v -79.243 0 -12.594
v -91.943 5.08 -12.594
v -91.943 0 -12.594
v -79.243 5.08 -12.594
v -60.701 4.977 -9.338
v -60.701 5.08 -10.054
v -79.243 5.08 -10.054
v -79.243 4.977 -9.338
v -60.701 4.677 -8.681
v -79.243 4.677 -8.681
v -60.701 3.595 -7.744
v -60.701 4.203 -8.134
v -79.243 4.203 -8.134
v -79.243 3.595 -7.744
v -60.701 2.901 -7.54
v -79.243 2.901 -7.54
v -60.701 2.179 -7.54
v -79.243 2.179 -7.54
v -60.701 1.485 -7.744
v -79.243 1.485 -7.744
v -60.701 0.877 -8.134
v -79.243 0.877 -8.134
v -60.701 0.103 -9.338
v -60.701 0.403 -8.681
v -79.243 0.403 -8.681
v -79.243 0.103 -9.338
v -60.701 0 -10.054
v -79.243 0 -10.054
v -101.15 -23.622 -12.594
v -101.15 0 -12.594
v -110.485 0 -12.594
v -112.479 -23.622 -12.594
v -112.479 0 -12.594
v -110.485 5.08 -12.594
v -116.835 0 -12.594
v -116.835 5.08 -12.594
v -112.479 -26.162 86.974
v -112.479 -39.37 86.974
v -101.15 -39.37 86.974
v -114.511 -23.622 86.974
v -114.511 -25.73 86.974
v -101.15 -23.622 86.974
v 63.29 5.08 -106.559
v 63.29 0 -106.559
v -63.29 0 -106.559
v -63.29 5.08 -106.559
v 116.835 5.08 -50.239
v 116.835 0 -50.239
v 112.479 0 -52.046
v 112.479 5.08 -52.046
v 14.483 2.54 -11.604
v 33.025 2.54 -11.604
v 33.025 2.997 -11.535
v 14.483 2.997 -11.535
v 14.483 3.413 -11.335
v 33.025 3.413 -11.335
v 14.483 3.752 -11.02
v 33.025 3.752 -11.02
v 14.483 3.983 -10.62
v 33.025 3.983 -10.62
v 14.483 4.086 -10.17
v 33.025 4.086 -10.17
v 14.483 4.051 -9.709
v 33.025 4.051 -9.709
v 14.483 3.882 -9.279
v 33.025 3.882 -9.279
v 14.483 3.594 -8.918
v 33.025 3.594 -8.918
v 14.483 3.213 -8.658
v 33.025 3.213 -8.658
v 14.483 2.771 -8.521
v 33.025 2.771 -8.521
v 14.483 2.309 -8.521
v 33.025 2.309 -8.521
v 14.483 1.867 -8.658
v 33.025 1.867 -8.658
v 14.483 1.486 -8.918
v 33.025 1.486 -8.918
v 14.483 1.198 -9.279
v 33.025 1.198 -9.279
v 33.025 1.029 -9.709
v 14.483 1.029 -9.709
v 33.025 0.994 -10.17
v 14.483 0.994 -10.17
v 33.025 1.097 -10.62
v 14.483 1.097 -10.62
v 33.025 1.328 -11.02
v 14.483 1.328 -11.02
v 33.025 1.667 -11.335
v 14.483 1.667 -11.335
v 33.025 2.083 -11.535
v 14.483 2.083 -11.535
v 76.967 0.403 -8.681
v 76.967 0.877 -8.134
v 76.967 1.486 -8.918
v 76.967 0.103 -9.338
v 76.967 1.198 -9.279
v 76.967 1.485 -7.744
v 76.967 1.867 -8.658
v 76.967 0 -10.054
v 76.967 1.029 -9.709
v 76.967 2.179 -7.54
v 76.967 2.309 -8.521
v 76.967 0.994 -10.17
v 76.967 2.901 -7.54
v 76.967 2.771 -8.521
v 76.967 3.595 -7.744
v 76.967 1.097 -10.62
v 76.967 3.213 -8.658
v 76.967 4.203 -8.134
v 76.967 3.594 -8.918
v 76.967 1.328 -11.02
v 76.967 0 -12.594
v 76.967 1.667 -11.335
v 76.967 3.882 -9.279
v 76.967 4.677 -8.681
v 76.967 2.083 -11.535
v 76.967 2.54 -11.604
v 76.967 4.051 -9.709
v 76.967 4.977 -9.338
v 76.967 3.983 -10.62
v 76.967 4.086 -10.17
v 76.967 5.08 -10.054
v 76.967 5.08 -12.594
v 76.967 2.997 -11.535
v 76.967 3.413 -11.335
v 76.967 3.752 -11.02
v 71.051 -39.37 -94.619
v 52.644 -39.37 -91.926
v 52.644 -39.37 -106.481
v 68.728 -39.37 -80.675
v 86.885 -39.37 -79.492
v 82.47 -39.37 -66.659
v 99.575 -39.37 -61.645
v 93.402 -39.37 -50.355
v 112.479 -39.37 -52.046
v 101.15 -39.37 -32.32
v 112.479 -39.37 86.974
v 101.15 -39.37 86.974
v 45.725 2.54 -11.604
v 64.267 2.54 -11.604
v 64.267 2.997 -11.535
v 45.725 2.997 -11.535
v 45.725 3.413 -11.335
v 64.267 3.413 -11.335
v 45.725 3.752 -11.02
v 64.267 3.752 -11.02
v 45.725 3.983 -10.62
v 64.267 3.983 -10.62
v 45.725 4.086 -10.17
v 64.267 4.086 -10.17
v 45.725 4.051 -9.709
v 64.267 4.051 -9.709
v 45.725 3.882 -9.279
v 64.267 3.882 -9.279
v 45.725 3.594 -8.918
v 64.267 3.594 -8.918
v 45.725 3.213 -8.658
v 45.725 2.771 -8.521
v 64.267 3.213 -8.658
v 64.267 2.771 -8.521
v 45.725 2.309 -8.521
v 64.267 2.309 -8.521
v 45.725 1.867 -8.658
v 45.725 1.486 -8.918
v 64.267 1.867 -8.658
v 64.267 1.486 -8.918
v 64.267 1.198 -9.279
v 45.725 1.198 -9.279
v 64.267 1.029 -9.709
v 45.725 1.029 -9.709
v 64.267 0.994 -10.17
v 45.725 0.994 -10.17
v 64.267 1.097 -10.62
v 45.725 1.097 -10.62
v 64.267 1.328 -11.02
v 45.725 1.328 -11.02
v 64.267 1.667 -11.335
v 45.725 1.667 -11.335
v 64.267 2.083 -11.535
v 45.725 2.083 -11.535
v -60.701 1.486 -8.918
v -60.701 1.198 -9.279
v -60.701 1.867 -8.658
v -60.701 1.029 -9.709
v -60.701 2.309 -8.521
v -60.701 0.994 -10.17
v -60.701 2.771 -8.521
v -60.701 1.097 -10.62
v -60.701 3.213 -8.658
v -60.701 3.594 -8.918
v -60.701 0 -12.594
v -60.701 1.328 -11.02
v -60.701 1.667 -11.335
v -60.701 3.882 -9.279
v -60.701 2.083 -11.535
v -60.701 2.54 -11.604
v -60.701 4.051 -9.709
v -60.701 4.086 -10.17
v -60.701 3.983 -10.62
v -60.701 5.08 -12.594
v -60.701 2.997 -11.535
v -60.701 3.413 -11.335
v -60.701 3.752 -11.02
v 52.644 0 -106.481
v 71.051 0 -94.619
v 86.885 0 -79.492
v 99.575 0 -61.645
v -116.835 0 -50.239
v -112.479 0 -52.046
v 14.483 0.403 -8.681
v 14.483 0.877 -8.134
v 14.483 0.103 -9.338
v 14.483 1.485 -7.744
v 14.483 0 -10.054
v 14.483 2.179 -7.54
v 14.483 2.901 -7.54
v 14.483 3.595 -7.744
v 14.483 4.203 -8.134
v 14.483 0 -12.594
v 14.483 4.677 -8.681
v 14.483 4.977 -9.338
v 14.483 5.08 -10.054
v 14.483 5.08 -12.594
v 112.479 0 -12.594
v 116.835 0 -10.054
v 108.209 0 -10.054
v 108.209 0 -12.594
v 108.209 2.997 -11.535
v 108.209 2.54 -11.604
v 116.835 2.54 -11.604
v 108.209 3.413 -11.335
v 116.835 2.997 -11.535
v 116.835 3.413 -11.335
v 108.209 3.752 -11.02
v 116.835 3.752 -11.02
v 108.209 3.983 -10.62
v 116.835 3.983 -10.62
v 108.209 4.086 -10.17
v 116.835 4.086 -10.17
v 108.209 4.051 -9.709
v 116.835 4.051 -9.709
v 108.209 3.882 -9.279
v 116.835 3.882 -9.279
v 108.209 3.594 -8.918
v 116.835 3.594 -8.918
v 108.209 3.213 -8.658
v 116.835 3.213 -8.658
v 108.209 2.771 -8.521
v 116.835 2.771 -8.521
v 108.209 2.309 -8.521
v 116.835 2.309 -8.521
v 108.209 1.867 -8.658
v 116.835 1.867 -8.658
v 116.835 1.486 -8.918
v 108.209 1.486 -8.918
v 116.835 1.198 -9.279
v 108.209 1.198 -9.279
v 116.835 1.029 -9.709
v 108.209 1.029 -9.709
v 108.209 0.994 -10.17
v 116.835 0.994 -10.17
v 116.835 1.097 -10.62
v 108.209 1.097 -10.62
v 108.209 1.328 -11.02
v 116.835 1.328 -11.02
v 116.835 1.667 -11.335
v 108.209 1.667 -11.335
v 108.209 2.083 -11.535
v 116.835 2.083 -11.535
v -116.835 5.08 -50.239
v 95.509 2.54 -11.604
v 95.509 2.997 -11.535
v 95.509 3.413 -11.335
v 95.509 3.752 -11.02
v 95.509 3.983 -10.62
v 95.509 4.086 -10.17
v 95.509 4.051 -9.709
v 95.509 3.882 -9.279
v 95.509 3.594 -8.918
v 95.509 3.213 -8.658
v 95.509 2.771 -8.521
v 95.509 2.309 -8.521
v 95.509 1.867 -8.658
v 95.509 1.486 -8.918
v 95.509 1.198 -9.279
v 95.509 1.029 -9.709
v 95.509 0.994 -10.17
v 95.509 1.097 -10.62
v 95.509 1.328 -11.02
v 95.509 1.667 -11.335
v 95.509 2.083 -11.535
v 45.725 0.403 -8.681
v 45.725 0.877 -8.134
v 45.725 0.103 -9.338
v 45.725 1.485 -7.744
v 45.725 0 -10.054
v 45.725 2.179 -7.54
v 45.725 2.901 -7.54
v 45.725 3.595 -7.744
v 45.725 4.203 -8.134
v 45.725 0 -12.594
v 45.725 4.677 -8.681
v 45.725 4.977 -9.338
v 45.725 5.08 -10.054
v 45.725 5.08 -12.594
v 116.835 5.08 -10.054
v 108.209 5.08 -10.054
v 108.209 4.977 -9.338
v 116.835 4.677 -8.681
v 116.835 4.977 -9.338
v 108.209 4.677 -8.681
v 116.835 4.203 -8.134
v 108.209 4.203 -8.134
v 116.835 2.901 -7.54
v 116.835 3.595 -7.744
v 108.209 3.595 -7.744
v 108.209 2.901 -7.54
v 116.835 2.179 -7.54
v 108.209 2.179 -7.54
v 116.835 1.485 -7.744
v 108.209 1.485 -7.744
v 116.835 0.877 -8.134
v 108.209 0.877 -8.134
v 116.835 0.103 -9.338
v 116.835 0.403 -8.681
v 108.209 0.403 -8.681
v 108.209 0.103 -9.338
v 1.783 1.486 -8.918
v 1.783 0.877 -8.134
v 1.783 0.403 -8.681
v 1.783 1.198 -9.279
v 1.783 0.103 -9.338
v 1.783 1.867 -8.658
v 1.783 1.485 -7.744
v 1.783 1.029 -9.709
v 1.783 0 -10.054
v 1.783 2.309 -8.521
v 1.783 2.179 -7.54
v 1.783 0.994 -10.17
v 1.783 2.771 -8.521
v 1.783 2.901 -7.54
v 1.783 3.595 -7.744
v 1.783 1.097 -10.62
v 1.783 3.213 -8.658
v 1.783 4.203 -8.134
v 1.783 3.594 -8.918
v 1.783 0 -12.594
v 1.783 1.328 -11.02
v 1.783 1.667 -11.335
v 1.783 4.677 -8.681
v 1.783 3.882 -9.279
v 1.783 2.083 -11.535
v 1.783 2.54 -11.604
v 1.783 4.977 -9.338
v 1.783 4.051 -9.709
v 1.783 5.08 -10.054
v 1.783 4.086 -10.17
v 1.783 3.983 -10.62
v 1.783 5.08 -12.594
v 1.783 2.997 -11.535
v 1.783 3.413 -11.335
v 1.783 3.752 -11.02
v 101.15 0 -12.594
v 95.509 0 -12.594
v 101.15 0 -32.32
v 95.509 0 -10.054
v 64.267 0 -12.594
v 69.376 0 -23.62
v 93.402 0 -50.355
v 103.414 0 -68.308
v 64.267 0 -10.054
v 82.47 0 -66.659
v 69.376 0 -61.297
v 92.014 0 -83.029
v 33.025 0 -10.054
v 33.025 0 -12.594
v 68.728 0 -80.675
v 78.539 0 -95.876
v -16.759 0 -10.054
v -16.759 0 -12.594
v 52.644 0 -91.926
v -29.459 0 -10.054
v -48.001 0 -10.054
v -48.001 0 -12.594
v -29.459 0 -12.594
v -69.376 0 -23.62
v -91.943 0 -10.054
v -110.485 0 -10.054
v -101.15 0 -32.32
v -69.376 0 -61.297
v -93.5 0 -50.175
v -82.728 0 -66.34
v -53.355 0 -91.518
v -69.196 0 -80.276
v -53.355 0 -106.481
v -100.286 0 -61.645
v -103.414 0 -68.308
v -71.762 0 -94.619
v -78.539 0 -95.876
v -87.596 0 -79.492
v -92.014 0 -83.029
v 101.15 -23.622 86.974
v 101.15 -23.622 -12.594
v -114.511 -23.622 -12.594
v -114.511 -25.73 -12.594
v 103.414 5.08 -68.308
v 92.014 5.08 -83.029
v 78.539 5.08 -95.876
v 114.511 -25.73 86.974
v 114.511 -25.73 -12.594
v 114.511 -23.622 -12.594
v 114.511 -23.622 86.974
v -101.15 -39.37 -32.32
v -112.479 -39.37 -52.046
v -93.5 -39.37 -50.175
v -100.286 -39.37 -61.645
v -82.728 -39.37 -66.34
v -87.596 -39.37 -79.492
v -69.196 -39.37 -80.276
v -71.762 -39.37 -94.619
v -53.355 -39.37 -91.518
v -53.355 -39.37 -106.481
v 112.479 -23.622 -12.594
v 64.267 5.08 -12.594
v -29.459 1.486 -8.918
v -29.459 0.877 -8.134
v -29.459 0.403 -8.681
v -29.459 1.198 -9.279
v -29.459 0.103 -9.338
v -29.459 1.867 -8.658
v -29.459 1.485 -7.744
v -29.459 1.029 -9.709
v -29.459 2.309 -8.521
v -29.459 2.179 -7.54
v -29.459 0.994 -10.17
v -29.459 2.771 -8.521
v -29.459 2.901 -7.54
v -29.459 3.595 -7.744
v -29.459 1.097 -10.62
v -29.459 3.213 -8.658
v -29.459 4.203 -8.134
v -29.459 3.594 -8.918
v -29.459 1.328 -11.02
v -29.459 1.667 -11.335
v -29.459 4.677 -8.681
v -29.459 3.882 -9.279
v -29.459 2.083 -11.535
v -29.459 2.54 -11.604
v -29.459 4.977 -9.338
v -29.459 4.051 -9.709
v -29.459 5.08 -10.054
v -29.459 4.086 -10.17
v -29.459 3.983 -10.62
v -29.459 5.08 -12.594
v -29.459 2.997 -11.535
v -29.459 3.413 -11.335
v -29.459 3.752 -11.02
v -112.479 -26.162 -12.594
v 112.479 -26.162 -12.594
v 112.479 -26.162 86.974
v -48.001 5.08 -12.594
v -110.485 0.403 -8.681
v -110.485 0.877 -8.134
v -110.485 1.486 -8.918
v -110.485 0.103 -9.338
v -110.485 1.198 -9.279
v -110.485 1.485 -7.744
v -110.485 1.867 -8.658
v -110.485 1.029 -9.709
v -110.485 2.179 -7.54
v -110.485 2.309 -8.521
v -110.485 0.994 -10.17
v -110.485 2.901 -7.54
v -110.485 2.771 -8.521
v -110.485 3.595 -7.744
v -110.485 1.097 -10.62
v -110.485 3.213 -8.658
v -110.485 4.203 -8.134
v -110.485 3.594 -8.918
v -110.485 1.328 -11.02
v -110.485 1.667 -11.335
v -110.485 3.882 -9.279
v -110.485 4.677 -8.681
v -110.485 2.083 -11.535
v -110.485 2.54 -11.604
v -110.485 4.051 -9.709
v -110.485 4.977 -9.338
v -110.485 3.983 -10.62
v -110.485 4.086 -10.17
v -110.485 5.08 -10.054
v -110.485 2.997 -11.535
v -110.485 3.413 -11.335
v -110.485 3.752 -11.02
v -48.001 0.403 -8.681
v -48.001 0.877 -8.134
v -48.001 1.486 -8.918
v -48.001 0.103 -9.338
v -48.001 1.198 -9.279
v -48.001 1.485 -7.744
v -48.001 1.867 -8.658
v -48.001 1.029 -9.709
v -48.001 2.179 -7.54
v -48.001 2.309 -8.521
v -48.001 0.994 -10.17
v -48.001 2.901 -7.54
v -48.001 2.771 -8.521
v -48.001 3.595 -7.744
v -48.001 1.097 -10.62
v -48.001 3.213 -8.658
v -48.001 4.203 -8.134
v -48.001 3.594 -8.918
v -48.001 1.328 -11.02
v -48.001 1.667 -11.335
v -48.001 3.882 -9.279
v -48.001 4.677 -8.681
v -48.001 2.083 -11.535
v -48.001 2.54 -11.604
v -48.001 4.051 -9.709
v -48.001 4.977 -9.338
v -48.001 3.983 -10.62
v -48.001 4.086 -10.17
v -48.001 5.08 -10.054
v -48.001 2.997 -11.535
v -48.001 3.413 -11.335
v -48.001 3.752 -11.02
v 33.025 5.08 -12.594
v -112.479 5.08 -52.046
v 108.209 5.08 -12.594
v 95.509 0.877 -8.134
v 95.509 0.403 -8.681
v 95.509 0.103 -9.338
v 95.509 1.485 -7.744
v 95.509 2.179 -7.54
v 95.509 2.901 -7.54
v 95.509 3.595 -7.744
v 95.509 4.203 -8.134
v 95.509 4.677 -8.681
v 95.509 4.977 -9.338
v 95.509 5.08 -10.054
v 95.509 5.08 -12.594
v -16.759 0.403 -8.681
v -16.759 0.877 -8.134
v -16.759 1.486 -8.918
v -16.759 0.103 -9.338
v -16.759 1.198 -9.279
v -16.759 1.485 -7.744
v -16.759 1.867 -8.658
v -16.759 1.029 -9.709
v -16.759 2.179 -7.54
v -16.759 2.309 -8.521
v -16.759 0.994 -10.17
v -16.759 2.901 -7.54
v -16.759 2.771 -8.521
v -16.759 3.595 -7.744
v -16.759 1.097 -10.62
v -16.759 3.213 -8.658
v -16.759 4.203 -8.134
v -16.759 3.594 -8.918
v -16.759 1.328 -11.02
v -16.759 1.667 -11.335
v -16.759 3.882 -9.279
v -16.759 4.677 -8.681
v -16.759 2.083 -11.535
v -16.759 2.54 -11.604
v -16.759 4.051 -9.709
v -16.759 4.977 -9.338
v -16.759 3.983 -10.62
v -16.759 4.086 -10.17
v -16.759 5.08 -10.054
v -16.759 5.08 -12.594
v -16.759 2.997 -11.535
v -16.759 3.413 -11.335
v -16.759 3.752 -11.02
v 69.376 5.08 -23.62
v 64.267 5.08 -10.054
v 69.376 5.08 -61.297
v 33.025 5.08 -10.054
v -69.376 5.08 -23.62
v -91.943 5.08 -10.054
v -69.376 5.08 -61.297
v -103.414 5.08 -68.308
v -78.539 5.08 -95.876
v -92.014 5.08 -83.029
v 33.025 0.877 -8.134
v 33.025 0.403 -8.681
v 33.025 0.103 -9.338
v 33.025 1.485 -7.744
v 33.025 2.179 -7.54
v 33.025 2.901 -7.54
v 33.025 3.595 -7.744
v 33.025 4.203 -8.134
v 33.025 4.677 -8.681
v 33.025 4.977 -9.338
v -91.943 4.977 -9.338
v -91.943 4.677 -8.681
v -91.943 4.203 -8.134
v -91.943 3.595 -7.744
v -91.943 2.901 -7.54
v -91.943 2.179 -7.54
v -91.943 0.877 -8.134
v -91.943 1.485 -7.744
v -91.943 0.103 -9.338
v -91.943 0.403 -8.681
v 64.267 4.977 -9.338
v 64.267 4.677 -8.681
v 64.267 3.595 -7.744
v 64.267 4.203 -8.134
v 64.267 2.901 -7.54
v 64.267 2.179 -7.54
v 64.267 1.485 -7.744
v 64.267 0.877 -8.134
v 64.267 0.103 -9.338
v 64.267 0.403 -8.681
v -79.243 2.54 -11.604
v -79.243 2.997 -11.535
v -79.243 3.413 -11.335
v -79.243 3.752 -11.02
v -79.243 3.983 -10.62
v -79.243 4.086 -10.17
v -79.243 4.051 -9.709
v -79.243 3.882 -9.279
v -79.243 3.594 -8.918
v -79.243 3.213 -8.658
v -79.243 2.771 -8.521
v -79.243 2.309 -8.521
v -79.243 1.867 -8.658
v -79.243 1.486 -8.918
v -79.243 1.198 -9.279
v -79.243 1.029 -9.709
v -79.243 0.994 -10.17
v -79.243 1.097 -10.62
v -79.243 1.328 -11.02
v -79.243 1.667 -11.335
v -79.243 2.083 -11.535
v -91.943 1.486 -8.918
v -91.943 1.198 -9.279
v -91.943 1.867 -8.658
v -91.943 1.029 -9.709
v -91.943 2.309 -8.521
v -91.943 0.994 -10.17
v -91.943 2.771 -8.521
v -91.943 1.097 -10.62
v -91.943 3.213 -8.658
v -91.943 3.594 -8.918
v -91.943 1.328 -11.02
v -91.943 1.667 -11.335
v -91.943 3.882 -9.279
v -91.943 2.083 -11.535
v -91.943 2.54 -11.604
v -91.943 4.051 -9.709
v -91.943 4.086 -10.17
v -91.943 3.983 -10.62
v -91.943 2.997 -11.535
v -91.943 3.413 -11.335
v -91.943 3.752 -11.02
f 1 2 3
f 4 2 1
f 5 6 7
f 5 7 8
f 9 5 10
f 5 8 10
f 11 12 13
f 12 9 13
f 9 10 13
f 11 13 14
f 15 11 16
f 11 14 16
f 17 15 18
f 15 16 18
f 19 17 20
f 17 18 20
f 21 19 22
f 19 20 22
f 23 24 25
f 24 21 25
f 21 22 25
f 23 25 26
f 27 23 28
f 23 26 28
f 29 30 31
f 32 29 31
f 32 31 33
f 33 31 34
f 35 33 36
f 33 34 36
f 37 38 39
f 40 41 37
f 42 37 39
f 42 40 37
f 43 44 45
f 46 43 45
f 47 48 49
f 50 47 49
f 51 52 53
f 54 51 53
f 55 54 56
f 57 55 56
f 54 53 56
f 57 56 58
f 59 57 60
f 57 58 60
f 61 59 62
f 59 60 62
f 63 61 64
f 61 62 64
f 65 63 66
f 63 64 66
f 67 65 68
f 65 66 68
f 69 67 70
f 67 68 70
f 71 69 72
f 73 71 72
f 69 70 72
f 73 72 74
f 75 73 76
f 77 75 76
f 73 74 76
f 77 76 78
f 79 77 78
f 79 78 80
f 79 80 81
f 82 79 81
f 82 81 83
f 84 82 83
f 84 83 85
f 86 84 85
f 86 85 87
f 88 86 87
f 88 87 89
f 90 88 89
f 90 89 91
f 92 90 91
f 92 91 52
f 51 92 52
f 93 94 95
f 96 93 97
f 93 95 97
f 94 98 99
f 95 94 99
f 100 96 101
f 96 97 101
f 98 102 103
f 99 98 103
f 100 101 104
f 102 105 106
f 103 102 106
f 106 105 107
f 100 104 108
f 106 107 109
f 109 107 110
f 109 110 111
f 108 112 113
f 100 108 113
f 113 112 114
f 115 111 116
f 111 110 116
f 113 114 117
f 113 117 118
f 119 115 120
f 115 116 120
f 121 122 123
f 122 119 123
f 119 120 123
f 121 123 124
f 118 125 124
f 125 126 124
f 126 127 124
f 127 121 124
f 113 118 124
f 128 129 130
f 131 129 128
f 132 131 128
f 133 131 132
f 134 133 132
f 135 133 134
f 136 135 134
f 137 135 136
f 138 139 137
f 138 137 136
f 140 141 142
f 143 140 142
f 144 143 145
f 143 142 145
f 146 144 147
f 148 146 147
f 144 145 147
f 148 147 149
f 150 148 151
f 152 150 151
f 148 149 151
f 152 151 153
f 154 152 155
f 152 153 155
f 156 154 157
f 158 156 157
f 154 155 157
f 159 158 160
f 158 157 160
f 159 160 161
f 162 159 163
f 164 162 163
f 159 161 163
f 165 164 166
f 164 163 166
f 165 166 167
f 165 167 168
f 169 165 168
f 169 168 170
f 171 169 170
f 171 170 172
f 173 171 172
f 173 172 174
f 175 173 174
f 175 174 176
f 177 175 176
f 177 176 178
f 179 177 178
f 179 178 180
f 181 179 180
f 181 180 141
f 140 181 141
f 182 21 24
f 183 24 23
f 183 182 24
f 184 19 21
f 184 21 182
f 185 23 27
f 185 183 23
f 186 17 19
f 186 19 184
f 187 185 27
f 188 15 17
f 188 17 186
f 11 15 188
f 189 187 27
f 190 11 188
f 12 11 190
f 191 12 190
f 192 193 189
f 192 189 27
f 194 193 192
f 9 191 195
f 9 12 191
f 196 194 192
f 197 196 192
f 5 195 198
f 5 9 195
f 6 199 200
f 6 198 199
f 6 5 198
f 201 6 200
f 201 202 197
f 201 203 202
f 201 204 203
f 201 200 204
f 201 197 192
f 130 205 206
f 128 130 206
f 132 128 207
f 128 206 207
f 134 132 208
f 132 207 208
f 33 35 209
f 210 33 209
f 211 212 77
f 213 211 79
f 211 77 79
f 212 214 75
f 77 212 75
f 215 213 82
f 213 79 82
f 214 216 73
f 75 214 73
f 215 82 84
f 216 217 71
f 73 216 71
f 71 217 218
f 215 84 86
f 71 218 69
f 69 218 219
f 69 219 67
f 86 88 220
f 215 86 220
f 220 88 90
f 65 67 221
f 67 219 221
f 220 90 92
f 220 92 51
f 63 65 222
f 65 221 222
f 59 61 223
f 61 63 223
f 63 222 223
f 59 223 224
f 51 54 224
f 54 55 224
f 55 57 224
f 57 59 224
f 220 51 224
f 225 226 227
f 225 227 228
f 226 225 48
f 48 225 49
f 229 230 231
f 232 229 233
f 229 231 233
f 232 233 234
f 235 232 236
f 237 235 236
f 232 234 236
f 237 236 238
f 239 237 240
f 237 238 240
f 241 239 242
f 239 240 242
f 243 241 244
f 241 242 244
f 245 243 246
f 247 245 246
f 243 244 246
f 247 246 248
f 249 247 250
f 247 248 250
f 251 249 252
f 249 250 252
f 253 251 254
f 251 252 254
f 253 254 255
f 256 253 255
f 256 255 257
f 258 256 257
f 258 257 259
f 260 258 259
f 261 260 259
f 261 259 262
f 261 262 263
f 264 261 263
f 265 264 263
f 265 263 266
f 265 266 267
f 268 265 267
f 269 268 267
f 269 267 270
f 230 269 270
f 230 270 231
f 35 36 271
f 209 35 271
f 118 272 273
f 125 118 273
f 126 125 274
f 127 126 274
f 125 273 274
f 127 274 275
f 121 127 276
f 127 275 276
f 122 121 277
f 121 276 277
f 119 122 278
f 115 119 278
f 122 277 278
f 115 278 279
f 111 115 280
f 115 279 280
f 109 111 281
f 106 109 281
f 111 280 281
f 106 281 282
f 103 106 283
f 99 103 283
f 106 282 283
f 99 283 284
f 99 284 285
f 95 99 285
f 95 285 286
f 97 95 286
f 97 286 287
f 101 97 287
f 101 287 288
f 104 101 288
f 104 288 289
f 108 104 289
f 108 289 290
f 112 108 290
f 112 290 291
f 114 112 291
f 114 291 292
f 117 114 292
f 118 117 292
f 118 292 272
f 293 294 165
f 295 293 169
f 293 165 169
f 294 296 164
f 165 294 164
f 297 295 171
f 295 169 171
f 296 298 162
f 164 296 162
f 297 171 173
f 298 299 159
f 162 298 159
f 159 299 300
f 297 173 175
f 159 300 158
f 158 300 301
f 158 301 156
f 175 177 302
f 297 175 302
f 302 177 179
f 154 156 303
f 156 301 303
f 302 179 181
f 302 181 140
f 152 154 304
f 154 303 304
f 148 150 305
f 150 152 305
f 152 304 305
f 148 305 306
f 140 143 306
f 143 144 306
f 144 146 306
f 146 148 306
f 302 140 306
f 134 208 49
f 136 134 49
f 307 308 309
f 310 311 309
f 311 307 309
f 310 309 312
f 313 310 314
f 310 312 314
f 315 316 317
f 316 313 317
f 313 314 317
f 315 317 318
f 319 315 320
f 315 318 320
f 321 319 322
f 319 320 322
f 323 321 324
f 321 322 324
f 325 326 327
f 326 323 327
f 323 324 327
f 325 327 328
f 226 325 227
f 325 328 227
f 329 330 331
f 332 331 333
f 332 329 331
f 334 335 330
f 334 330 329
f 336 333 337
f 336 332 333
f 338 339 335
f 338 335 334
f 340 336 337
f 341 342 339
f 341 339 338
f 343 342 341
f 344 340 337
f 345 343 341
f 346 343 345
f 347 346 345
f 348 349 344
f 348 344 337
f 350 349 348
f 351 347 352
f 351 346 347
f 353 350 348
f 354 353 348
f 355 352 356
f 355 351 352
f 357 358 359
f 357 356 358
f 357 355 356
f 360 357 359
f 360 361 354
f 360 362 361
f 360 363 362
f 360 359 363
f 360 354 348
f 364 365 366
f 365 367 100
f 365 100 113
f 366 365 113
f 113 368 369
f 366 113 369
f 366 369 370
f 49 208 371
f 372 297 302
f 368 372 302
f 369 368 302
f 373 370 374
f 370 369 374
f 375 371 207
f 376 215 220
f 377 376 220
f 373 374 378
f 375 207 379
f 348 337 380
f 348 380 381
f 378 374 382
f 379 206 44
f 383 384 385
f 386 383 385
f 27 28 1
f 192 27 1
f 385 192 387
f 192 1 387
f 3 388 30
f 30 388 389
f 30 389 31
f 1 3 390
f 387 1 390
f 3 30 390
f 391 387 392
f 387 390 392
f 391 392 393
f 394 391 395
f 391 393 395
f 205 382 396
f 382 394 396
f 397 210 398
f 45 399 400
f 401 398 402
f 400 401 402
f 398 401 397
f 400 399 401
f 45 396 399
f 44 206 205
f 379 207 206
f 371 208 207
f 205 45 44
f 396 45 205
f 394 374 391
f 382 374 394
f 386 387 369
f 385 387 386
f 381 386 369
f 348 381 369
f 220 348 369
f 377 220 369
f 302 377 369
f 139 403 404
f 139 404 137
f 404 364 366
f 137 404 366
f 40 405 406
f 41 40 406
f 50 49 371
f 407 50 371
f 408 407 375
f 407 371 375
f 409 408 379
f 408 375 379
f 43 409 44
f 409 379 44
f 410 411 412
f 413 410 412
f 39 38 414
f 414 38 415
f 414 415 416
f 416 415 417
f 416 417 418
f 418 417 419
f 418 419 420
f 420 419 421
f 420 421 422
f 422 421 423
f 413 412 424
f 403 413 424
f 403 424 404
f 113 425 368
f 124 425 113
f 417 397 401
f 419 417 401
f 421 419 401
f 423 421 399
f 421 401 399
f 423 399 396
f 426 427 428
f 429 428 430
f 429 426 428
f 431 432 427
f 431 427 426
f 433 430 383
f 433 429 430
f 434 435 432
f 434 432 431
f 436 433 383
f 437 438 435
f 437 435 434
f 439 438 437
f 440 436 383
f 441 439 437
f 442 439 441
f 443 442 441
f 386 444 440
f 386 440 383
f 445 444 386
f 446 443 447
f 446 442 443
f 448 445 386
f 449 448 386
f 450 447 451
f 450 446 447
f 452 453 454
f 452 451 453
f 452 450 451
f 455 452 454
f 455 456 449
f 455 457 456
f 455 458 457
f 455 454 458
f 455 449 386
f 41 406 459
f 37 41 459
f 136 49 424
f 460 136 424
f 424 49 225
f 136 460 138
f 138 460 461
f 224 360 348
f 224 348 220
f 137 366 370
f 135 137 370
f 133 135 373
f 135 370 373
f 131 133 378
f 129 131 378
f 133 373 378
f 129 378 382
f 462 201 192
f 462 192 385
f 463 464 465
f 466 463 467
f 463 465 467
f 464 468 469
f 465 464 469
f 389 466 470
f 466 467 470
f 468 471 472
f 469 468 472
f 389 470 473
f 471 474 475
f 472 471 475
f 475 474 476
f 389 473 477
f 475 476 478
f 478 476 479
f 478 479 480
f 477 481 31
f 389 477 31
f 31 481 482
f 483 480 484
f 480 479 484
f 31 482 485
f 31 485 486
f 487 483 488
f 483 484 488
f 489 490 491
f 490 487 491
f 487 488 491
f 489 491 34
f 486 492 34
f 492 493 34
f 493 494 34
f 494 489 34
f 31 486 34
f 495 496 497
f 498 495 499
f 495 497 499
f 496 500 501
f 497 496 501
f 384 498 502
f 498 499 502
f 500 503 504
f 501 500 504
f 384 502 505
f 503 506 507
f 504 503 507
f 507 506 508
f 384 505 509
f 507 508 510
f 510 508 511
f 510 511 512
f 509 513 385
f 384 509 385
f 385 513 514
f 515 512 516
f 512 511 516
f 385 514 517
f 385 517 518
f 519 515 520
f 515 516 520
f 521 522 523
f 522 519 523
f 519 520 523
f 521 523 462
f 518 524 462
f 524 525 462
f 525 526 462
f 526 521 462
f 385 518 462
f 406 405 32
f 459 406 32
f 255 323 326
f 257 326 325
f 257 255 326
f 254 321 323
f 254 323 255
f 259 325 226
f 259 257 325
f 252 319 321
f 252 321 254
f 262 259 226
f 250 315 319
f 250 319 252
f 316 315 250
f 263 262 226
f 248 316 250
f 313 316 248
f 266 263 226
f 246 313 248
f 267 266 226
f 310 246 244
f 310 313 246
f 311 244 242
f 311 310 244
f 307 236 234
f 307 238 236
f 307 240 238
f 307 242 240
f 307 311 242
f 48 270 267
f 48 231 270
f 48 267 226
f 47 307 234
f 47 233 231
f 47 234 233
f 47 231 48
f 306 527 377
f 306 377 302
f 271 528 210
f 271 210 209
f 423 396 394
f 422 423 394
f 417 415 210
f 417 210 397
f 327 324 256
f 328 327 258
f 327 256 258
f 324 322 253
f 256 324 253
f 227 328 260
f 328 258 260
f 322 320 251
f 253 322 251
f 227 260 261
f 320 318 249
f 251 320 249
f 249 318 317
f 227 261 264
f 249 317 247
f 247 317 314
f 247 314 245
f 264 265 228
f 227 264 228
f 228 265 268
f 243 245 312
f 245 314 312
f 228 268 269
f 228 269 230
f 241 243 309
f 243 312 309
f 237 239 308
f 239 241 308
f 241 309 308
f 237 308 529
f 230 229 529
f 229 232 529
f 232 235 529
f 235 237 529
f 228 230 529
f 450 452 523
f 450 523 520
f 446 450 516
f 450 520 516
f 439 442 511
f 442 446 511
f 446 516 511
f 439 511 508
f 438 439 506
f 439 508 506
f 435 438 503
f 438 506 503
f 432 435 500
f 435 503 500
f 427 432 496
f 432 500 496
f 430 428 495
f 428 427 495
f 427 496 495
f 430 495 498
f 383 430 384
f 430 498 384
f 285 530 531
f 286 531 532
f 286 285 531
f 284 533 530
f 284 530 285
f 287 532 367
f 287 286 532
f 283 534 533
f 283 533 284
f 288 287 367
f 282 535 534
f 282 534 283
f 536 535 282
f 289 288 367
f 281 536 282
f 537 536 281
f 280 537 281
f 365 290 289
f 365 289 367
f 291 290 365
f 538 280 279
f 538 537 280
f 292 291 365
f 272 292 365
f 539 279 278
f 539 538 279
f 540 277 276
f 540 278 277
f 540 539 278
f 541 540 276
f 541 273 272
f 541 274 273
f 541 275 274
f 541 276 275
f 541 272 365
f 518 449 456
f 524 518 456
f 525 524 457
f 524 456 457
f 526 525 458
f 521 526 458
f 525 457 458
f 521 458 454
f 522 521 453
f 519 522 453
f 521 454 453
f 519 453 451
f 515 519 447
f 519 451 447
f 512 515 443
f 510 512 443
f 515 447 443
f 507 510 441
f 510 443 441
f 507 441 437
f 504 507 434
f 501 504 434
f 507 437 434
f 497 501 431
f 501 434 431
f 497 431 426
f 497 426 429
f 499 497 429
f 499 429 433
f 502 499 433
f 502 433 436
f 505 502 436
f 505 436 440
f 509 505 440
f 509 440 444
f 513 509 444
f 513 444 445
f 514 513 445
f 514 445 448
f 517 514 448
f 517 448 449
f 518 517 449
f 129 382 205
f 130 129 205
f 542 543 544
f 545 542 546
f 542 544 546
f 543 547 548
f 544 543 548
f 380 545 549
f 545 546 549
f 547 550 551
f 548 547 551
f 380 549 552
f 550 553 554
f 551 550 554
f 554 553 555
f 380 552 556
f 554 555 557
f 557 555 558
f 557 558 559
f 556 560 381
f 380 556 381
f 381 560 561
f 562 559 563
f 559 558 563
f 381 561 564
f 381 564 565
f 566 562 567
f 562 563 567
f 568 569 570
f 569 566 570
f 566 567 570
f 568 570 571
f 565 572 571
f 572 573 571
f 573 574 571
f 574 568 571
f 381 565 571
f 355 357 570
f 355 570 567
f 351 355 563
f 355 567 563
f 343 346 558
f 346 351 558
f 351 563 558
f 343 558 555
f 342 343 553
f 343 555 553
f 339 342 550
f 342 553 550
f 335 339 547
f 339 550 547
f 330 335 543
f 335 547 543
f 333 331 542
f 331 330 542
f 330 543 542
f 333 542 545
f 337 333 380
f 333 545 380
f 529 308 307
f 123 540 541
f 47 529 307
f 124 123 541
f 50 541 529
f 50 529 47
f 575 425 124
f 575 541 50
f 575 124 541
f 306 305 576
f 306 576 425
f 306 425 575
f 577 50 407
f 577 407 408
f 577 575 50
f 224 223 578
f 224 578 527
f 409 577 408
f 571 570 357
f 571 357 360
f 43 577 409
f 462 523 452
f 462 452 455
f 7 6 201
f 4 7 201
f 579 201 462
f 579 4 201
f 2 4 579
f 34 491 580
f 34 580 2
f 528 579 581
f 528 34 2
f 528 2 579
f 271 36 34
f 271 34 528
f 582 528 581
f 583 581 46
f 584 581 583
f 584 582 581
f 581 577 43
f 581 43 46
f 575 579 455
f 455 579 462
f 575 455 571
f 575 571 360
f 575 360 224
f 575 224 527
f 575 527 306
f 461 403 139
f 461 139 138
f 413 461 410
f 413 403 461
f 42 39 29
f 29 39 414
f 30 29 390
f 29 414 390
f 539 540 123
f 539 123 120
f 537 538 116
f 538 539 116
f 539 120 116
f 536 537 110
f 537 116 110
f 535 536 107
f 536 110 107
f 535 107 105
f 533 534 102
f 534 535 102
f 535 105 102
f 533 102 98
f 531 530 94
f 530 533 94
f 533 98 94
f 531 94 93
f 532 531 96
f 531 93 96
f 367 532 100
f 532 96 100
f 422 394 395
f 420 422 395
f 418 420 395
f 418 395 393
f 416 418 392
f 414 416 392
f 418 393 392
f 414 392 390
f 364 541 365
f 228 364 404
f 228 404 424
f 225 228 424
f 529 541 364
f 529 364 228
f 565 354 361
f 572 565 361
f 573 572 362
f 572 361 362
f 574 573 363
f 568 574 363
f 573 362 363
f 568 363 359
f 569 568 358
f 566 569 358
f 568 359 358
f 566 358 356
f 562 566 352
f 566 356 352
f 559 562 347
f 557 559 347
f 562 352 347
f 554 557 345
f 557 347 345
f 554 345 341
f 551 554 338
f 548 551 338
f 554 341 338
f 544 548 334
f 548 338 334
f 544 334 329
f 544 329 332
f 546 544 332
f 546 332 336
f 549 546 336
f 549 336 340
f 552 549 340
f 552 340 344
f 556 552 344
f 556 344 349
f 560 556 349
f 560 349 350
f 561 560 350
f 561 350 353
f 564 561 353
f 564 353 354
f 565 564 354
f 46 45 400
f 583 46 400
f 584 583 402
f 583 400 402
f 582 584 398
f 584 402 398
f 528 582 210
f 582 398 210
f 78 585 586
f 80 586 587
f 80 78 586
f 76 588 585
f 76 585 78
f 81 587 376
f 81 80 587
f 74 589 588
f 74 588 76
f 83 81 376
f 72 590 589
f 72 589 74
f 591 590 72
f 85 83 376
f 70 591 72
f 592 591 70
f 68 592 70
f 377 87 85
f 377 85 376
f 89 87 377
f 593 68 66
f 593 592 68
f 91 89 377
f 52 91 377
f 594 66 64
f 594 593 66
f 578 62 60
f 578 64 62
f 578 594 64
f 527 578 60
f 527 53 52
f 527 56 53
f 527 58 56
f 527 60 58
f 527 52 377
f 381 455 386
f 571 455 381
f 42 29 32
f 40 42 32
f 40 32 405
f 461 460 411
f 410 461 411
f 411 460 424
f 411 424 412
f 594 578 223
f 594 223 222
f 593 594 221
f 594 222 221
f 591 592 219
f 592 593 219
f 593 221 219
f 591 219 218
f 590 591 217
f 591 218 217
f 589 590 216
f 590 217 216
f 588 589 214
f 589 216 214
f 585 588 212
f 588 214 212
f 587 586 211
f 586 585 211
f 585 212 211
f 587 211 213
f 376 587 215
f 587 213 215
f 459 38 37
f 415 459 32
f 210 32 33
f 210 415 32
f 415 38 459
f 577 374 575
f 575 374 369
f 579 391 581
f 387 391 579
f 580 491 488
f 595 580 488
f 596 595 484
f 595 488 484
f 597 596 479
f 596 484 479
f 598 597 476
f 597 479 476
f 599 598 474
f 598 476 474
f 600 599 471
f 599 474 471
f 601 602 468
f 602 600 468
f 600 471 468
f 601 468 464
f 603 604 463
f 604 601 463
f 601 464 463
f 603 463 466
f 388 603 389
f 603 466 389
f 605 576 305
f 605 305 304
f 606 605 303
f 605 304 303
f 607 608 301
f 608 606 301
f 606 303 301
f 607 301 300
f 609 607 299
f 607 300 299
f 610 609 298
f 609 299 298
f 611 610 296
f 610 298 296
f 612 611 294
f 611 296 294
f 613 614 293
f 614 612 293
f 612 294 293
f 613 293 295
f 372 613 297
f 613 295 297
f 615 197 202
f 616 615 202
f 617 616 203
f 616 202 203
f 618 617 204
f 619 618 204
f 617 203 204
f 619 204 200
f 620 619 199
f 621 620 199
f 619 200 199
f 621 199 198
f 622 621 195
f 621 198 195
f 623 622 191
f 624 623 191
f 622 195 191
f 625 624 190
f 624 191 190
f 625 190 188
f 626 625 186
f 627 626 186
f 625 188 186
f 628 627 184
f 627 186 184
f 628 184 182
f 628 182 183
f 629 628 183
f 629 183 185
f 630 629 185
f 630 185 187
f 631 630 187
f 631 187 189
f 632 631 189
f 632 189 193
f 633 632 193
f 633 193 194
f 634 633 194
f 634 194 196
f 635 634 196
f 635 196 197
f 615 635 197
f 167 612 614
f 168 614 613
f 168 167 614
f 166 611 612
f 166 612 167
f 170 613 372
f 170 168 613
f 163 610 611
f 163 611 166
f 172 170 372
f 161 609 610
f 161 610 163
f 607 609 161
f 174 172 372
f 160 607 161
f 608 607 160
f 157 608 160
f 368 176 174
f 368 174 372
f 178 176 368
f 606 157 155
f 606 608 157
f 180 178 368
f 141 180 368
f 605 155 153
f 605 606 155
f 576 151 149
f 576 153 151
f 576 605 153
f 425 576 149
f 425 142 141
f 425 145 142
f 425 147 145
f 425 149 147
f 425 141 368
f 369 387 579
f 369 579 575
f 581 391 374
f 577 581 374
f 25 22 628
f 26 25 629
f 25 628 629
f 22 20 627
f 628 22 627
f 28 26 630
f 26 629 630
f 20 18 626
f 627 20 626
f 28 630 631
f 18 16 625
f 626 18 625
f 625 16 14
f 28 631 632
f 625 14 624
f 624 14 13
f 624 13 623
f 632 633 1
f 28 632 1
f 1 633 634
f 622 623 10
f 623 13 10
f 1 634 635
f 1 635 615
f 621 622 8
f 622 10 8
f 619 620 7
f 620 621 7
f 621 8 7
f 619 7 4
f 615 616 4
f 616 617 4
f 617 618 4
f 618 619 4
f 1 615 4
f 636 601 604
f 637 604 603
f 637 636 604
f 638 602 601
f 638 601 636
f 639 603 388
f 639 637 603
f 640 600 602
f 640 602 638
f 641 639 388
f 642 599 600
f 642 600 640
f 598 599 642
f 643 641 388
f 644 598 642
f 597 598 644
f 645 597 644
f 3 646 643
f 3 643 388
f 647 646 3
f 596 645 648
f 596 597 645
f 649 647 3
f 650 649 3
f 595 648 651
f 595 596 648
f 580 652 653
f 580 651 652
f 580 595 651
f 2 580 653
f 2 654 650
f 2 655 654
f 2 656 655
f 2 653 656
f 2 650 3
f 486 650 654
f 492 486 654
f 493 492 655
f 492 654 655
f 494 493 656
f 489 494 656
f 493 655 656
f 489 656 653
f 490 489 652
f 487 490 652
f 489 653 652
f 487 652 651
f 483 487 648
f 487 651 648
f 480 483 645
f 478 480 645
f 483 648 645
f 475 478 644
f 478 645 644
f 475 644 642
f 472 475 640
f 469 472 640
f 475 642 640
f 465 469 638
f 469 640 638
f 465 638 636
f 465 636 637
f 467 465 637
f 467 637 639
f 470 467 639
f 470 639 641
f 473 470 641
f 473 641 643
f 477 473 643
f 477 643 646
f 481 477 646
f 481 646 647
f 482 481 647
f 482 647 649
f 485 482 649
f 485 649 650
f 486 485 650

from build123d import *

# Parameters (mm, degrees)
BOSS_EXTRUDE1_DEPTH      = 5.08
BOSS_EXTRUDE2_DEPTH      = 154.427309
BOSS_EXTRUDE2_DEPTH_BACK = 154.427309
SKETCH2_R                = 2.54
SKETCH2_W                = 2.54
SKETCH2_H                = 5.08
SKETCH3_W                = 12.7
SKETCH3_H                = 6.227195603
CUT_EXTRUDE1_DEPTH       = 5.08
BOSS_EXTRUDE3_DEPTH      = 39.37
SKETCH5_W                = 138.751749018
SKETCH5_H                = 37.67744757
CUT_EXTRUDE2_DEPTH       = 5.08
SKETCH6_W                = 11.329576632
SKETCH6_H                = 15.748
BOSS_EXTRUDE4_DEPTH      = 99.568
SKETCH7_W                = 58.494788807
SKETCH7_H                = 56.964758344
CUT_EXTRUDE3_DEPTH       = 5.08
LIP1_START               = -12.594044208
LIP1_DEPTH               = 99.568
LIP2_START               = -12.594044208
LIP2_DEPTH               = 99.568
CUT_EXTRUDE4_REACH       = 261.821
SKETCH8_R                = 1.55


# Read off the part's stored shape, not the designer's step: Lip1, Lip2
with BuildPart() as part:
    # Sketch1 → Boss-Extrude1 (new body)
    with BuildSketch(Plane(origin=(0, 0, 0), x_dir=(1, 0, 0), z_dir=(0, 1, 0))):
        with BuildLine():
            ThreePointArc((-150.649044256, 36.211449361), (-152.994577449, 24.475760888), (-154.427308629, 12.594044208))
            Line((-154.427308629, 12.594044208), (0, 12.594044208))
            Line((0, 12.594044208), (0, 106.558758971))
            Line((0, 106.558758971), (-63.290413745, 106.558758971))
            ThreePointArc((-63.290413745, 106.558758971), (-92.01449877, 83.028775744), (-112.479484736, 52.046240008))
            Line((-112.479484736, 52.046240008), (-150.649044256, 36.211449361))
        make_face()
        with BuildLine():
            Line((0, 106.558758971), (0, 12.594044208))
            Line((0, 12.594044208), (154.427308629, 12.594044208))
            ThreePointArc((154.427308629, 12.594044208), (152.994577449, 24.475760888), (150.649044256, 36.211449361))
            Line((150.649044256, 36.211449361), (112.479484736, 52.046240008))
            ThreePointArc((112.479484736, 52.046240008), (92.01449877, 83.028775744), (63.290413745, 106.558758971))
            Line((63.290413745, 106.558758971), (0, 106.558758971))
        make_face()
    extrude(amount=BOSS_EXTRUDE1_DEPTH)

    # Sketch2 → Boss-Extrude2 (add, two sides: drawn at the far end of the back side and taken through both)
    with BuildSketch(Plane(origin=(0, 0, 0), x_dir=(0, 0, -1), z_dir=(1, 0, 0)).offset(-BOSS_EXTRUDE2_DEPTH_BACK)):
        with Locations((10.054044208, 2.54)):
            Circle(SKETCH2_R)
        with Locations((11.324044208, 2.54)):
            Rectangle(SKETCH2_W, SKETCH2_H)
    extrude(amount=BOSS_EXTRUDE2_DEPTH + BOSS_EXTRUDE2_DEPTH_BACK)

    # Sketch3 → Cut-Extrude1 (cut)
    with BuildSketch(Plane(origin=(0, 5.08, 0), x_dir=(1, 0, 0), z_dir=(0, 1, 0))):
        with Locations((-116.835308629, 9.480446407)):
            Rectangle(SKETCH3_W, SKETCH3_H)
        with Locations((-148.077308629, 9.480446407)):
            Rectangle(SKETCH3_W, SKETCH3_H)
        with Locations((-85.593308629, 9.480446407)):
            Rectangle(SKETCH3_W, SKETCH3_H)
        with Locations((-54.351308629, 9.480446407)):
            Rectangle(SKETCH3_W, SKETCH3_H)
        with Locations((-23.109308629, 9.480446407)):
            Rectangle(SKETCH3_W, SKETCH3_H)
        with Locations((8.132691371, 9.480446407)):
            Rectangle(SKETCH3_W, SKETCH3_H)
        with Locations((39.374691371, 9.480446407)):
            Rectangle(SKETCH3_W, SKETCH3_H)
        with Locations((70.616691371, 9.480446407)):
            Rectangle(SKETCH3_W, SKETCH3_H)
        with Locations((101.858691371, 9.480446407)):
            Rectangle(SKETCH3_W, SKETCH3_H)
        with Locations((133.100691371, 9.480446407)):
            Rectangle(SKETCH3_W, SKETCH3_H)
    extrude(amount=-CUT_EXTRUDE1_DEPTH, mode=Mode.SUBTRACT)

    # Sketch4 → Boss-Extrude3 (add)
    with BuildSketch(Plane.XZ):
        with BuildLine():
            Line((-53.354740134, -106.481309786), (-53.354740134, -91.517526844))
            ThreePointArc((-53.354740134, -91.517526844), (-82.728496733, -66.340222196), (-101.149908104, -32.320142108))
            Line((-101.149908104, -32.320142108), (-101.149908104, -52.046240008))
            Line((-101.149908104, -52.046240008), (-112.479484736, -52.046240008))
            Line((-112.479484736, -52.046240008), (-100.285956923, -61.644665115))
            ThreePointArc((-100.285956923, -61.644665115), (-80.038963099, -87.43196163), (-53.354740134, -106.481309786))
        make_face()
        Polygon((-101.149908104, -52.046240008), (-101.149908104, -32.320142108), (-101.149908104, -12.594044208), (-110.485308629, -12.594044208), (-112.479484736, -12.594044208), (-112.479484736, -52.046240008), align=None)
        with BuildLine():
            Line((99.574939951, -61.644665115), (112.479484736, -52.046240008))
            Line((112.479484736, -52.046240008), (101.149908104, -52.046240008))
            Line((101.149908104, -52.046240008), (101.149908104, -32.320142108))
            ThreePointArc((101.149908104, -32.320142108), (82.470268628, -66.658795409), (52.643723162, -91.92634826))
            Line((52.643723162, -91.92634826), (52.643723162, -106.481309786))
            ThreePointArc((52.643723162, -106.481309786), (79.327946127, -87.43196163), (99.574939951, -61.644665115))
        make_face()
        Polygon((112.479484736, -52.046240008), (112.479484736, -12.594044208), (108.208691371, -12.594044208), (101.149908104, -12.594044208), (101.149908104, -32.320142108), (101.149908104, -52.046240008), align=None)
    extrude(amount=BOSS_EXTRUDE3_DEPTH)

    # Sketch5 → Cut-Extrude2 (cut)
    with BuildSketch(Plane.XZ):
        with Locations((0, -42.458273938)):
            Rectangle(SKETCH5_W, SKETCH5_H)
    extrude(amount=-CUT_EXTRUDE2_DEPTH, mode=Mode.SUBTRACT)

    # Sketch6 → Boss-Extrude4 (add)
    with BuildSketch(Plane.XY.offset(-12.594044208)):
        with Locations((-106.81469642, -31.496)):
            Rectangle(SKETCH6_W, SKETCH6_H)
        with Locations((106.81469642, -31.496)):
            Rectangle(SKETCH6_W, SKETCH6_H)
    extrude(amount=BOSS_EXTRUDE4_DEPTH)

    # Sketch7 → Cut-Extrude3 (cut)
    with BuildSketch(Plane(origin=(0, 5.08, 0), x_dir=(1, 0, 0), z_dir=(0, 1, 0))):
        with Locations((-146.082703033, 21.756830304)):
            Rectangle(SKETCH7_W, SKETCH7_H)
        with Locations((146.082703033, 21.756830304)):
            Rectangle(SKETCH7_W, SKETCH7_H)
    extrude(amount=-CUT_EXTRUDE3_DEPTH, mode=Mode.SUBTRACT)

    # Lip1 outline → Lip1 (add)
    with BuildSketch(Plane.XY.offset(LIP1_START)):
        Polygon((-112.479484736, -23.622), (-114.511484736, -23.622), (-114.511484736, -25.730085067), (-112.479484736, -26.162), align=None)
    extrude(amount=LIP1_DEPTH)

    # Lip2 outline → Lip2 (add)
    with BuildSketch(Plane.XY.offset(LIP2_START)):
        Polygon((114.511484736, -23.622), (112.479484736, -23.622), (112.479484736, -26.162), (114.511484736, -25.730085067), align=None)
    extrude(amount=LIP2_DEPTH)

    # Cut-Extrude4: up to this face of the body (flat: up to its plane)
    cut_extrude4_end = Plane(part.part.faces().sort_by_distance((-116.835308629, 2.54, -31.416626842))[0])
    # Sketch8 → Cut-Extrude4 (cut, up to the picked face)
    with BuildSketch(Plane(origin=(116.835308629, 0, 0), x_dir=(0, 0, -1), z_dir=(1, 0, 0)), mode=Mode.PRIVATE) as cut_extrude4_sk1:
        with Locations((10.054044208, 2.54)):
            Circle(SKETCH8_R)
    cut_extrude4_tool1 = split(extrude(cut_extrude4_sk1.sketch, amount=-CUT_EXTRUDE4_REACH, mode=Mode.PRIVATE), bisect_by=cut_extrude4_end, keep=Keep.BOTH, mode=Mode.PRIVATE)
    add(cut_extrude4_tool1.solids().sort_by(Axis((116.835309, 2.54, -10.054044), (-1, 0, 0)))[0], mode=Mode.SUBTRACT)


solid = part.part
